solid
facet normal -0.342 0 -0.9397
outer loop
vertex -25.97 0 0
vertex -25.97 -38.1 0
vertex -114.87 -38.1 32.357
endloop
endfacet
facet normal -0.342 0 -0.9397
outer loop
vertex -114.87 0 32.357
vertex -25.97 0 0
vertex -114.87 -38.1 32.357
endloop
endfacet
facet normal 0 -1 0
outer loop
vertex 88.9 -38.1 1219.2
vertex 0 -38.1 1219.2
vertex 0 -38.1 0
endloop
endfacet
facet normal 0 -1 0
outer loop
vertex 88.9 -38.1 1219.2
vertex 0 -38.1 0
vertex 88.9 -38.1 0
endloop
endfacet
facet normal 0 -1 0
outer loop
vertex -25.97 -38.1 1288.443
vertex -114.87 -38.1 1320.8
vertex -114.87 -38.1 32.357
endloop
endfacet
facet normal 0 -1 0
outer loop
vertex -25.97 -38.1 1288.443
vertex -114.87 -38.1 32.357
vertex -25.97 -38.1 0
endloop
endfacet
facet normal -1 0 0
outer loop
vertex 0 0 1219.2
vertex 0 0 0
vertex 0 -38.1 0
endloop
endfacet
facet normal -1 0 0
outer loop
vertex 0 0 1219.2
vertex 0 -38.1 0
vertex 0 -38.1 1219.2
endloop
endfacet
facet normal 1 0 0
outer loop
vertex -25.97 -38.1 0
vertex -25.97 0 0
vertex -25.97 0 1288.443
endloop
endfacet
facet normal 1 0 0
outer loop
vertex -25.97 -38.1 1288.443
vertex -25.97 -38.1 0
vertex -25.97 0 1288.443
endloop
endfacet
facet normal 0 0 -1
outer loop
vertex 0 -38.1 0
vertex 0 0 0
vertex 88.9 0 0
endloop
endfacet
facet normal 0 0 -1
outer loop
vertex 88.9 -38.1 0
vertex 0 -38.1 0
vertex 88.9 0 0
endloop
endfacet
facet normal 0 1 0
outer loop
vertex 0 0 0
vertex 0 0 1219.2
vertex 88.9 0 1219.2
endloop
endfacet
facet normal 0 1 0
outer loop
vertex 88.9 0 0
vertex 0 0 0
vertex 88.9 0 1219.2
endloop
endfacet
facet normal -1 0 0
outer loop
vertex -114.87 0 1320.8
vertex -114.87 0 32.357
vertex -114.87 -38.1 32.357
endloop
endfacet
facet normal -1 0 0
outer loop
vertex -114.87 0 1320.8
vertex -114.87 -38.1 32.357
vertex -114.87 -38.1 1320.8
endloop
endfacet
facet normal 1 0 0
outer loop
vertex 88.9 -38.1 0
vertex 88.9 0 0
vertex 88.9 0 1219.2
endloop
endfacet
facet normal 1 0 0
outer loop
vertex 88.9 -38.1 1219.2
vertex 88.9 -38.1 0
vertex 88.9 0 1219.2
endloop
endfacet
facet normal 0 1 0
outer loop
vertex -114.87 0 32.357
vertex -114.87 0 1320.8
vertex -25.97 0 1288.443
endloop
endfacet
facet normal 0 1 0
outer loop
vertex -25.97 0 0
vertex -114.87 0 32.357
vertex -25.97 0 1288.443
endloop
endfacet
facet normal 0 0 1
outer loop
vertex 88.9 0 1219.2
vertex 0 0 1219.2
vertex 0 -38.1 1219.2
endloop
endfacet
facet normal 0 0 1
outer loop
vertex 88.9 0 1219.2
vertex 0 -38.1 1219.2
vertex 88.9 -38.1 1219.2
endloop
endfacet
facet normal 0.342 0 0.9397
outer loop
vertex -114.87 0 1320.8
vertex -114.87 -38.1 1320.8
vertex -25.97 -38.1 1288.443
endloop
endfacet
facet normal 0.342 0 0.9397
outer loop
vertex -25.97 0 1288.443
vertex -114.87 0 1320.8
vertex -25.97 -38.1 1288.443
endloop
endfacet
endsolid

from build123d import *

# Parameters (mm, degrees)
F0_W     = 88.9
F0_H     = 1219.2
F1_DEPTH = 38.1
F2_W     = 88.9
F2_H     = 1320.8
F3_DEPTH = 38.1
F5_DEPTH = 38.101


with BuildPart() as f1:
    # F0 (on Front) → F1 (new body)
    with BuildSketch(Plane.XZ):
        with Locations((44.45, 609.6)):
            Rectangle(F0_W, F0_H)
    extrude(amount=F1_DEPTH)


with BuildPart() as f3:
    # F2 (on Front) → F3 (new body)
    with BuildSketch(Plane.XZ):
        with Locations((-70.420187, 660.4)):
            Rectangle(F2_W, F2_H)
    extrude(amount=F3_DEPTH)

    # F4 (on face) → F5 (cut, through all)
    with BuildSketch(Plane.XZ.offset(38.1)):
        Polygon((-114.870187, 0), (-25.970187, 0), (-114.870187, 32.356954), align=None)
        Polygon((-25.970187, 1320.8), (-114.870187, 1320.8), (-25.970187, 1288.443046), align=None)
    extrude(amount=-F5_DEPTH, mode=Mode.SUBTRACT)


solid = Compound([f1.part, f3.part])
